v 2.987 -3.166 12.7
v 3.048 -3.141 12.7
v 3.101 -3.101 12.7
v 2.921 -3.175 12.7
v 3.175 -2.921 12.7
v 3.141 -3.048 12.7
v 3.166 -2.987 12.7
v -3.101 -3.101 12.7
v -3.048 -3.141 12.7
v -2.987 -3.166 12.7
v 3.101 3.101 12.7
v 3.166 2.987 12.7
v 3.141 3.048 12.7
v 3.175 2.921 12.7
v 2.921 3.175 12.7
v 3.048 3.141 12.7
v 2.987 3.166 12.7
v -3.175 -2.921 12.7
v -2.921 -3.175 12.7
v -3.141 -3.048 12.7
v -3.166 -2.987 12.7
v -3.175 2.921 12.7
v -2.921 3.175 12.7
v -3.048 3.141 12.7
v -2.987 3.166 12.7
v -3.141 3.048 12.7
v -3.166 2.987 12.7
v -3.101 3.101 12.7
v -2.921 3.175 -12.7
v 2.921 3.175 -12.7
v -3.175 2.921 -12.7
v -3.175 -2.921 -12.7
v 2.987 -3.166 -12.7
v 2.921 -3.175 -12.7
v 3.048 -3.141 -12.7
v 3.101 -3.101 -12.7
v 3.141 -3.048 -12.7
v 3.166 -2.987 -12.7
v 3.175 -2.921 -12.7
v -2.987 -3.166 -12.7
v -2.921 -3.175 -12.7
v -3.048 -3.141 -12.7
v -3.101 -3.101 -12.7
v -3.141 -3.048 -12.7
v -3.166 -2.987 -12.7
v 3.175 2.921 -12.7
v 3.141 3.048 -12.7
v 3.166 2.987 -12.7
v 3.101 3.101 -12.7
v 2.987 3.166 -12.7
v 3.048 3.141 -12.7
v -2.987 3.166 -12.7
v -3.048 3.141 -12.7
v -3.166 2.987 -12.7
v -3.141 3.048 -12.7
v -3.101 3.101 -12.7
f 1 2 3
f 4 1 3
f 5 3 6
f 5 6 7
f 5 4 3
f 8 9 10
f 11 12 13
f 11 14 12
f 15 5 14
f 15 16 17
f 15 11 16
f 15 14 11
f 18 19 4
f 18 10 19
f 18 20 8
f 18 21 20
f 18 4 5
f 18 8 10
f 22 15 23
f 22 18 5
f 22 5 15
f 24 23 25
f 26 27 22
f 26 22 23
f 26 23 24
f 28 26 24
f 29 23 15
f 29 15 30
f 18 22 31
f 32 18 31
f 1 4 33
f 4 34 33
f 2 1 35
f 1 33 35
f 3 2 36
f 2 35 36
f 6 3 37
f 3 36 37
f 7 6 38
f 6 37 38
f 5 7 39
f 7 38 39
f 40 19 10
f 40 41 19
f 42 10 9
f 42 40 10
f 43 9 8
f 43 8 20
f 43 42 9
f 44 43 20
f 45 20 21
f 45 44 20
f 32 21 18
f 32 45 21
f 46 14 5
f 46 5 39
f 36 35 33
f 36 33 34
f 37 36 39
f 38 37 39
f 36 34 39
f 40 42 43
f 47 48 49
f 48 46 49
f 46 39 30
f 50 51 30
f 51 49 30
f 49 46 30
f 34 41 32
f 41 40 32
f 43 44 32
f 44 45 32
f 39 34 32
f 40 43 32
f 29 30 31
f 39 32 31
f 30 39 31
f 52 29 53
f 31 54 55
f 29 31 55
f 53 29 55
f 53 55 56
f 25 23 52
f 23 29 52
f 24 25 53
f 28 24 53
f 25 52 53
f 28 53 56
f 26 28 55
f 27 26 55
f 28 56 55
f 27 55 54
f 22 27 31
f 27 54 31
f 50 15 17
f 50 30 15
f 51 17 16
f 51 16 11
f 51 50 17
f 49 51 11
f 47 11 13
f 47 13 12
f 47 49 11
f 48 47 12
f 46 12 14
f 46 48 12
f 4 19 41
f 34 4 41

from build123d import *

# Parameters (mm, degrees)
BOSS_EXTRUDE1_START = -3.175
SKETCH4_W           = 25.4
SKETCH4_H           = 6.35
BOSS_EXTRUDE1_DEPTH = 6.35
FILLET1_R           = 0.254


with BuildPart() as part:
    # Sketch4 → Boss-Extrude1 (new body)
    with BuildSketch(Plane(origin=(0, 0, 0), x_dir=(0, 0, -1), z_dir=(1, 0, 0)).offset(BOSS_EXTRUDE1_START)):
        Rectangle(SKETCH4_W, SKETCH4_H)
    extrude(amount=BOSS_EXTRUDE1_DEPTH)

    # Fillet1
    fillet1_edges = [part.edges().sort_by_distance(p)[0] for p in [
        (3.175, 3.175, 0),
        (3.175, -3.175, 0),
        (-3.175, 3.175, 0),
        (-3.175, -3.175, 0),
    ]]
    fillet(fillet1_edges, radius=FILLET1_R)


solid = part.part
